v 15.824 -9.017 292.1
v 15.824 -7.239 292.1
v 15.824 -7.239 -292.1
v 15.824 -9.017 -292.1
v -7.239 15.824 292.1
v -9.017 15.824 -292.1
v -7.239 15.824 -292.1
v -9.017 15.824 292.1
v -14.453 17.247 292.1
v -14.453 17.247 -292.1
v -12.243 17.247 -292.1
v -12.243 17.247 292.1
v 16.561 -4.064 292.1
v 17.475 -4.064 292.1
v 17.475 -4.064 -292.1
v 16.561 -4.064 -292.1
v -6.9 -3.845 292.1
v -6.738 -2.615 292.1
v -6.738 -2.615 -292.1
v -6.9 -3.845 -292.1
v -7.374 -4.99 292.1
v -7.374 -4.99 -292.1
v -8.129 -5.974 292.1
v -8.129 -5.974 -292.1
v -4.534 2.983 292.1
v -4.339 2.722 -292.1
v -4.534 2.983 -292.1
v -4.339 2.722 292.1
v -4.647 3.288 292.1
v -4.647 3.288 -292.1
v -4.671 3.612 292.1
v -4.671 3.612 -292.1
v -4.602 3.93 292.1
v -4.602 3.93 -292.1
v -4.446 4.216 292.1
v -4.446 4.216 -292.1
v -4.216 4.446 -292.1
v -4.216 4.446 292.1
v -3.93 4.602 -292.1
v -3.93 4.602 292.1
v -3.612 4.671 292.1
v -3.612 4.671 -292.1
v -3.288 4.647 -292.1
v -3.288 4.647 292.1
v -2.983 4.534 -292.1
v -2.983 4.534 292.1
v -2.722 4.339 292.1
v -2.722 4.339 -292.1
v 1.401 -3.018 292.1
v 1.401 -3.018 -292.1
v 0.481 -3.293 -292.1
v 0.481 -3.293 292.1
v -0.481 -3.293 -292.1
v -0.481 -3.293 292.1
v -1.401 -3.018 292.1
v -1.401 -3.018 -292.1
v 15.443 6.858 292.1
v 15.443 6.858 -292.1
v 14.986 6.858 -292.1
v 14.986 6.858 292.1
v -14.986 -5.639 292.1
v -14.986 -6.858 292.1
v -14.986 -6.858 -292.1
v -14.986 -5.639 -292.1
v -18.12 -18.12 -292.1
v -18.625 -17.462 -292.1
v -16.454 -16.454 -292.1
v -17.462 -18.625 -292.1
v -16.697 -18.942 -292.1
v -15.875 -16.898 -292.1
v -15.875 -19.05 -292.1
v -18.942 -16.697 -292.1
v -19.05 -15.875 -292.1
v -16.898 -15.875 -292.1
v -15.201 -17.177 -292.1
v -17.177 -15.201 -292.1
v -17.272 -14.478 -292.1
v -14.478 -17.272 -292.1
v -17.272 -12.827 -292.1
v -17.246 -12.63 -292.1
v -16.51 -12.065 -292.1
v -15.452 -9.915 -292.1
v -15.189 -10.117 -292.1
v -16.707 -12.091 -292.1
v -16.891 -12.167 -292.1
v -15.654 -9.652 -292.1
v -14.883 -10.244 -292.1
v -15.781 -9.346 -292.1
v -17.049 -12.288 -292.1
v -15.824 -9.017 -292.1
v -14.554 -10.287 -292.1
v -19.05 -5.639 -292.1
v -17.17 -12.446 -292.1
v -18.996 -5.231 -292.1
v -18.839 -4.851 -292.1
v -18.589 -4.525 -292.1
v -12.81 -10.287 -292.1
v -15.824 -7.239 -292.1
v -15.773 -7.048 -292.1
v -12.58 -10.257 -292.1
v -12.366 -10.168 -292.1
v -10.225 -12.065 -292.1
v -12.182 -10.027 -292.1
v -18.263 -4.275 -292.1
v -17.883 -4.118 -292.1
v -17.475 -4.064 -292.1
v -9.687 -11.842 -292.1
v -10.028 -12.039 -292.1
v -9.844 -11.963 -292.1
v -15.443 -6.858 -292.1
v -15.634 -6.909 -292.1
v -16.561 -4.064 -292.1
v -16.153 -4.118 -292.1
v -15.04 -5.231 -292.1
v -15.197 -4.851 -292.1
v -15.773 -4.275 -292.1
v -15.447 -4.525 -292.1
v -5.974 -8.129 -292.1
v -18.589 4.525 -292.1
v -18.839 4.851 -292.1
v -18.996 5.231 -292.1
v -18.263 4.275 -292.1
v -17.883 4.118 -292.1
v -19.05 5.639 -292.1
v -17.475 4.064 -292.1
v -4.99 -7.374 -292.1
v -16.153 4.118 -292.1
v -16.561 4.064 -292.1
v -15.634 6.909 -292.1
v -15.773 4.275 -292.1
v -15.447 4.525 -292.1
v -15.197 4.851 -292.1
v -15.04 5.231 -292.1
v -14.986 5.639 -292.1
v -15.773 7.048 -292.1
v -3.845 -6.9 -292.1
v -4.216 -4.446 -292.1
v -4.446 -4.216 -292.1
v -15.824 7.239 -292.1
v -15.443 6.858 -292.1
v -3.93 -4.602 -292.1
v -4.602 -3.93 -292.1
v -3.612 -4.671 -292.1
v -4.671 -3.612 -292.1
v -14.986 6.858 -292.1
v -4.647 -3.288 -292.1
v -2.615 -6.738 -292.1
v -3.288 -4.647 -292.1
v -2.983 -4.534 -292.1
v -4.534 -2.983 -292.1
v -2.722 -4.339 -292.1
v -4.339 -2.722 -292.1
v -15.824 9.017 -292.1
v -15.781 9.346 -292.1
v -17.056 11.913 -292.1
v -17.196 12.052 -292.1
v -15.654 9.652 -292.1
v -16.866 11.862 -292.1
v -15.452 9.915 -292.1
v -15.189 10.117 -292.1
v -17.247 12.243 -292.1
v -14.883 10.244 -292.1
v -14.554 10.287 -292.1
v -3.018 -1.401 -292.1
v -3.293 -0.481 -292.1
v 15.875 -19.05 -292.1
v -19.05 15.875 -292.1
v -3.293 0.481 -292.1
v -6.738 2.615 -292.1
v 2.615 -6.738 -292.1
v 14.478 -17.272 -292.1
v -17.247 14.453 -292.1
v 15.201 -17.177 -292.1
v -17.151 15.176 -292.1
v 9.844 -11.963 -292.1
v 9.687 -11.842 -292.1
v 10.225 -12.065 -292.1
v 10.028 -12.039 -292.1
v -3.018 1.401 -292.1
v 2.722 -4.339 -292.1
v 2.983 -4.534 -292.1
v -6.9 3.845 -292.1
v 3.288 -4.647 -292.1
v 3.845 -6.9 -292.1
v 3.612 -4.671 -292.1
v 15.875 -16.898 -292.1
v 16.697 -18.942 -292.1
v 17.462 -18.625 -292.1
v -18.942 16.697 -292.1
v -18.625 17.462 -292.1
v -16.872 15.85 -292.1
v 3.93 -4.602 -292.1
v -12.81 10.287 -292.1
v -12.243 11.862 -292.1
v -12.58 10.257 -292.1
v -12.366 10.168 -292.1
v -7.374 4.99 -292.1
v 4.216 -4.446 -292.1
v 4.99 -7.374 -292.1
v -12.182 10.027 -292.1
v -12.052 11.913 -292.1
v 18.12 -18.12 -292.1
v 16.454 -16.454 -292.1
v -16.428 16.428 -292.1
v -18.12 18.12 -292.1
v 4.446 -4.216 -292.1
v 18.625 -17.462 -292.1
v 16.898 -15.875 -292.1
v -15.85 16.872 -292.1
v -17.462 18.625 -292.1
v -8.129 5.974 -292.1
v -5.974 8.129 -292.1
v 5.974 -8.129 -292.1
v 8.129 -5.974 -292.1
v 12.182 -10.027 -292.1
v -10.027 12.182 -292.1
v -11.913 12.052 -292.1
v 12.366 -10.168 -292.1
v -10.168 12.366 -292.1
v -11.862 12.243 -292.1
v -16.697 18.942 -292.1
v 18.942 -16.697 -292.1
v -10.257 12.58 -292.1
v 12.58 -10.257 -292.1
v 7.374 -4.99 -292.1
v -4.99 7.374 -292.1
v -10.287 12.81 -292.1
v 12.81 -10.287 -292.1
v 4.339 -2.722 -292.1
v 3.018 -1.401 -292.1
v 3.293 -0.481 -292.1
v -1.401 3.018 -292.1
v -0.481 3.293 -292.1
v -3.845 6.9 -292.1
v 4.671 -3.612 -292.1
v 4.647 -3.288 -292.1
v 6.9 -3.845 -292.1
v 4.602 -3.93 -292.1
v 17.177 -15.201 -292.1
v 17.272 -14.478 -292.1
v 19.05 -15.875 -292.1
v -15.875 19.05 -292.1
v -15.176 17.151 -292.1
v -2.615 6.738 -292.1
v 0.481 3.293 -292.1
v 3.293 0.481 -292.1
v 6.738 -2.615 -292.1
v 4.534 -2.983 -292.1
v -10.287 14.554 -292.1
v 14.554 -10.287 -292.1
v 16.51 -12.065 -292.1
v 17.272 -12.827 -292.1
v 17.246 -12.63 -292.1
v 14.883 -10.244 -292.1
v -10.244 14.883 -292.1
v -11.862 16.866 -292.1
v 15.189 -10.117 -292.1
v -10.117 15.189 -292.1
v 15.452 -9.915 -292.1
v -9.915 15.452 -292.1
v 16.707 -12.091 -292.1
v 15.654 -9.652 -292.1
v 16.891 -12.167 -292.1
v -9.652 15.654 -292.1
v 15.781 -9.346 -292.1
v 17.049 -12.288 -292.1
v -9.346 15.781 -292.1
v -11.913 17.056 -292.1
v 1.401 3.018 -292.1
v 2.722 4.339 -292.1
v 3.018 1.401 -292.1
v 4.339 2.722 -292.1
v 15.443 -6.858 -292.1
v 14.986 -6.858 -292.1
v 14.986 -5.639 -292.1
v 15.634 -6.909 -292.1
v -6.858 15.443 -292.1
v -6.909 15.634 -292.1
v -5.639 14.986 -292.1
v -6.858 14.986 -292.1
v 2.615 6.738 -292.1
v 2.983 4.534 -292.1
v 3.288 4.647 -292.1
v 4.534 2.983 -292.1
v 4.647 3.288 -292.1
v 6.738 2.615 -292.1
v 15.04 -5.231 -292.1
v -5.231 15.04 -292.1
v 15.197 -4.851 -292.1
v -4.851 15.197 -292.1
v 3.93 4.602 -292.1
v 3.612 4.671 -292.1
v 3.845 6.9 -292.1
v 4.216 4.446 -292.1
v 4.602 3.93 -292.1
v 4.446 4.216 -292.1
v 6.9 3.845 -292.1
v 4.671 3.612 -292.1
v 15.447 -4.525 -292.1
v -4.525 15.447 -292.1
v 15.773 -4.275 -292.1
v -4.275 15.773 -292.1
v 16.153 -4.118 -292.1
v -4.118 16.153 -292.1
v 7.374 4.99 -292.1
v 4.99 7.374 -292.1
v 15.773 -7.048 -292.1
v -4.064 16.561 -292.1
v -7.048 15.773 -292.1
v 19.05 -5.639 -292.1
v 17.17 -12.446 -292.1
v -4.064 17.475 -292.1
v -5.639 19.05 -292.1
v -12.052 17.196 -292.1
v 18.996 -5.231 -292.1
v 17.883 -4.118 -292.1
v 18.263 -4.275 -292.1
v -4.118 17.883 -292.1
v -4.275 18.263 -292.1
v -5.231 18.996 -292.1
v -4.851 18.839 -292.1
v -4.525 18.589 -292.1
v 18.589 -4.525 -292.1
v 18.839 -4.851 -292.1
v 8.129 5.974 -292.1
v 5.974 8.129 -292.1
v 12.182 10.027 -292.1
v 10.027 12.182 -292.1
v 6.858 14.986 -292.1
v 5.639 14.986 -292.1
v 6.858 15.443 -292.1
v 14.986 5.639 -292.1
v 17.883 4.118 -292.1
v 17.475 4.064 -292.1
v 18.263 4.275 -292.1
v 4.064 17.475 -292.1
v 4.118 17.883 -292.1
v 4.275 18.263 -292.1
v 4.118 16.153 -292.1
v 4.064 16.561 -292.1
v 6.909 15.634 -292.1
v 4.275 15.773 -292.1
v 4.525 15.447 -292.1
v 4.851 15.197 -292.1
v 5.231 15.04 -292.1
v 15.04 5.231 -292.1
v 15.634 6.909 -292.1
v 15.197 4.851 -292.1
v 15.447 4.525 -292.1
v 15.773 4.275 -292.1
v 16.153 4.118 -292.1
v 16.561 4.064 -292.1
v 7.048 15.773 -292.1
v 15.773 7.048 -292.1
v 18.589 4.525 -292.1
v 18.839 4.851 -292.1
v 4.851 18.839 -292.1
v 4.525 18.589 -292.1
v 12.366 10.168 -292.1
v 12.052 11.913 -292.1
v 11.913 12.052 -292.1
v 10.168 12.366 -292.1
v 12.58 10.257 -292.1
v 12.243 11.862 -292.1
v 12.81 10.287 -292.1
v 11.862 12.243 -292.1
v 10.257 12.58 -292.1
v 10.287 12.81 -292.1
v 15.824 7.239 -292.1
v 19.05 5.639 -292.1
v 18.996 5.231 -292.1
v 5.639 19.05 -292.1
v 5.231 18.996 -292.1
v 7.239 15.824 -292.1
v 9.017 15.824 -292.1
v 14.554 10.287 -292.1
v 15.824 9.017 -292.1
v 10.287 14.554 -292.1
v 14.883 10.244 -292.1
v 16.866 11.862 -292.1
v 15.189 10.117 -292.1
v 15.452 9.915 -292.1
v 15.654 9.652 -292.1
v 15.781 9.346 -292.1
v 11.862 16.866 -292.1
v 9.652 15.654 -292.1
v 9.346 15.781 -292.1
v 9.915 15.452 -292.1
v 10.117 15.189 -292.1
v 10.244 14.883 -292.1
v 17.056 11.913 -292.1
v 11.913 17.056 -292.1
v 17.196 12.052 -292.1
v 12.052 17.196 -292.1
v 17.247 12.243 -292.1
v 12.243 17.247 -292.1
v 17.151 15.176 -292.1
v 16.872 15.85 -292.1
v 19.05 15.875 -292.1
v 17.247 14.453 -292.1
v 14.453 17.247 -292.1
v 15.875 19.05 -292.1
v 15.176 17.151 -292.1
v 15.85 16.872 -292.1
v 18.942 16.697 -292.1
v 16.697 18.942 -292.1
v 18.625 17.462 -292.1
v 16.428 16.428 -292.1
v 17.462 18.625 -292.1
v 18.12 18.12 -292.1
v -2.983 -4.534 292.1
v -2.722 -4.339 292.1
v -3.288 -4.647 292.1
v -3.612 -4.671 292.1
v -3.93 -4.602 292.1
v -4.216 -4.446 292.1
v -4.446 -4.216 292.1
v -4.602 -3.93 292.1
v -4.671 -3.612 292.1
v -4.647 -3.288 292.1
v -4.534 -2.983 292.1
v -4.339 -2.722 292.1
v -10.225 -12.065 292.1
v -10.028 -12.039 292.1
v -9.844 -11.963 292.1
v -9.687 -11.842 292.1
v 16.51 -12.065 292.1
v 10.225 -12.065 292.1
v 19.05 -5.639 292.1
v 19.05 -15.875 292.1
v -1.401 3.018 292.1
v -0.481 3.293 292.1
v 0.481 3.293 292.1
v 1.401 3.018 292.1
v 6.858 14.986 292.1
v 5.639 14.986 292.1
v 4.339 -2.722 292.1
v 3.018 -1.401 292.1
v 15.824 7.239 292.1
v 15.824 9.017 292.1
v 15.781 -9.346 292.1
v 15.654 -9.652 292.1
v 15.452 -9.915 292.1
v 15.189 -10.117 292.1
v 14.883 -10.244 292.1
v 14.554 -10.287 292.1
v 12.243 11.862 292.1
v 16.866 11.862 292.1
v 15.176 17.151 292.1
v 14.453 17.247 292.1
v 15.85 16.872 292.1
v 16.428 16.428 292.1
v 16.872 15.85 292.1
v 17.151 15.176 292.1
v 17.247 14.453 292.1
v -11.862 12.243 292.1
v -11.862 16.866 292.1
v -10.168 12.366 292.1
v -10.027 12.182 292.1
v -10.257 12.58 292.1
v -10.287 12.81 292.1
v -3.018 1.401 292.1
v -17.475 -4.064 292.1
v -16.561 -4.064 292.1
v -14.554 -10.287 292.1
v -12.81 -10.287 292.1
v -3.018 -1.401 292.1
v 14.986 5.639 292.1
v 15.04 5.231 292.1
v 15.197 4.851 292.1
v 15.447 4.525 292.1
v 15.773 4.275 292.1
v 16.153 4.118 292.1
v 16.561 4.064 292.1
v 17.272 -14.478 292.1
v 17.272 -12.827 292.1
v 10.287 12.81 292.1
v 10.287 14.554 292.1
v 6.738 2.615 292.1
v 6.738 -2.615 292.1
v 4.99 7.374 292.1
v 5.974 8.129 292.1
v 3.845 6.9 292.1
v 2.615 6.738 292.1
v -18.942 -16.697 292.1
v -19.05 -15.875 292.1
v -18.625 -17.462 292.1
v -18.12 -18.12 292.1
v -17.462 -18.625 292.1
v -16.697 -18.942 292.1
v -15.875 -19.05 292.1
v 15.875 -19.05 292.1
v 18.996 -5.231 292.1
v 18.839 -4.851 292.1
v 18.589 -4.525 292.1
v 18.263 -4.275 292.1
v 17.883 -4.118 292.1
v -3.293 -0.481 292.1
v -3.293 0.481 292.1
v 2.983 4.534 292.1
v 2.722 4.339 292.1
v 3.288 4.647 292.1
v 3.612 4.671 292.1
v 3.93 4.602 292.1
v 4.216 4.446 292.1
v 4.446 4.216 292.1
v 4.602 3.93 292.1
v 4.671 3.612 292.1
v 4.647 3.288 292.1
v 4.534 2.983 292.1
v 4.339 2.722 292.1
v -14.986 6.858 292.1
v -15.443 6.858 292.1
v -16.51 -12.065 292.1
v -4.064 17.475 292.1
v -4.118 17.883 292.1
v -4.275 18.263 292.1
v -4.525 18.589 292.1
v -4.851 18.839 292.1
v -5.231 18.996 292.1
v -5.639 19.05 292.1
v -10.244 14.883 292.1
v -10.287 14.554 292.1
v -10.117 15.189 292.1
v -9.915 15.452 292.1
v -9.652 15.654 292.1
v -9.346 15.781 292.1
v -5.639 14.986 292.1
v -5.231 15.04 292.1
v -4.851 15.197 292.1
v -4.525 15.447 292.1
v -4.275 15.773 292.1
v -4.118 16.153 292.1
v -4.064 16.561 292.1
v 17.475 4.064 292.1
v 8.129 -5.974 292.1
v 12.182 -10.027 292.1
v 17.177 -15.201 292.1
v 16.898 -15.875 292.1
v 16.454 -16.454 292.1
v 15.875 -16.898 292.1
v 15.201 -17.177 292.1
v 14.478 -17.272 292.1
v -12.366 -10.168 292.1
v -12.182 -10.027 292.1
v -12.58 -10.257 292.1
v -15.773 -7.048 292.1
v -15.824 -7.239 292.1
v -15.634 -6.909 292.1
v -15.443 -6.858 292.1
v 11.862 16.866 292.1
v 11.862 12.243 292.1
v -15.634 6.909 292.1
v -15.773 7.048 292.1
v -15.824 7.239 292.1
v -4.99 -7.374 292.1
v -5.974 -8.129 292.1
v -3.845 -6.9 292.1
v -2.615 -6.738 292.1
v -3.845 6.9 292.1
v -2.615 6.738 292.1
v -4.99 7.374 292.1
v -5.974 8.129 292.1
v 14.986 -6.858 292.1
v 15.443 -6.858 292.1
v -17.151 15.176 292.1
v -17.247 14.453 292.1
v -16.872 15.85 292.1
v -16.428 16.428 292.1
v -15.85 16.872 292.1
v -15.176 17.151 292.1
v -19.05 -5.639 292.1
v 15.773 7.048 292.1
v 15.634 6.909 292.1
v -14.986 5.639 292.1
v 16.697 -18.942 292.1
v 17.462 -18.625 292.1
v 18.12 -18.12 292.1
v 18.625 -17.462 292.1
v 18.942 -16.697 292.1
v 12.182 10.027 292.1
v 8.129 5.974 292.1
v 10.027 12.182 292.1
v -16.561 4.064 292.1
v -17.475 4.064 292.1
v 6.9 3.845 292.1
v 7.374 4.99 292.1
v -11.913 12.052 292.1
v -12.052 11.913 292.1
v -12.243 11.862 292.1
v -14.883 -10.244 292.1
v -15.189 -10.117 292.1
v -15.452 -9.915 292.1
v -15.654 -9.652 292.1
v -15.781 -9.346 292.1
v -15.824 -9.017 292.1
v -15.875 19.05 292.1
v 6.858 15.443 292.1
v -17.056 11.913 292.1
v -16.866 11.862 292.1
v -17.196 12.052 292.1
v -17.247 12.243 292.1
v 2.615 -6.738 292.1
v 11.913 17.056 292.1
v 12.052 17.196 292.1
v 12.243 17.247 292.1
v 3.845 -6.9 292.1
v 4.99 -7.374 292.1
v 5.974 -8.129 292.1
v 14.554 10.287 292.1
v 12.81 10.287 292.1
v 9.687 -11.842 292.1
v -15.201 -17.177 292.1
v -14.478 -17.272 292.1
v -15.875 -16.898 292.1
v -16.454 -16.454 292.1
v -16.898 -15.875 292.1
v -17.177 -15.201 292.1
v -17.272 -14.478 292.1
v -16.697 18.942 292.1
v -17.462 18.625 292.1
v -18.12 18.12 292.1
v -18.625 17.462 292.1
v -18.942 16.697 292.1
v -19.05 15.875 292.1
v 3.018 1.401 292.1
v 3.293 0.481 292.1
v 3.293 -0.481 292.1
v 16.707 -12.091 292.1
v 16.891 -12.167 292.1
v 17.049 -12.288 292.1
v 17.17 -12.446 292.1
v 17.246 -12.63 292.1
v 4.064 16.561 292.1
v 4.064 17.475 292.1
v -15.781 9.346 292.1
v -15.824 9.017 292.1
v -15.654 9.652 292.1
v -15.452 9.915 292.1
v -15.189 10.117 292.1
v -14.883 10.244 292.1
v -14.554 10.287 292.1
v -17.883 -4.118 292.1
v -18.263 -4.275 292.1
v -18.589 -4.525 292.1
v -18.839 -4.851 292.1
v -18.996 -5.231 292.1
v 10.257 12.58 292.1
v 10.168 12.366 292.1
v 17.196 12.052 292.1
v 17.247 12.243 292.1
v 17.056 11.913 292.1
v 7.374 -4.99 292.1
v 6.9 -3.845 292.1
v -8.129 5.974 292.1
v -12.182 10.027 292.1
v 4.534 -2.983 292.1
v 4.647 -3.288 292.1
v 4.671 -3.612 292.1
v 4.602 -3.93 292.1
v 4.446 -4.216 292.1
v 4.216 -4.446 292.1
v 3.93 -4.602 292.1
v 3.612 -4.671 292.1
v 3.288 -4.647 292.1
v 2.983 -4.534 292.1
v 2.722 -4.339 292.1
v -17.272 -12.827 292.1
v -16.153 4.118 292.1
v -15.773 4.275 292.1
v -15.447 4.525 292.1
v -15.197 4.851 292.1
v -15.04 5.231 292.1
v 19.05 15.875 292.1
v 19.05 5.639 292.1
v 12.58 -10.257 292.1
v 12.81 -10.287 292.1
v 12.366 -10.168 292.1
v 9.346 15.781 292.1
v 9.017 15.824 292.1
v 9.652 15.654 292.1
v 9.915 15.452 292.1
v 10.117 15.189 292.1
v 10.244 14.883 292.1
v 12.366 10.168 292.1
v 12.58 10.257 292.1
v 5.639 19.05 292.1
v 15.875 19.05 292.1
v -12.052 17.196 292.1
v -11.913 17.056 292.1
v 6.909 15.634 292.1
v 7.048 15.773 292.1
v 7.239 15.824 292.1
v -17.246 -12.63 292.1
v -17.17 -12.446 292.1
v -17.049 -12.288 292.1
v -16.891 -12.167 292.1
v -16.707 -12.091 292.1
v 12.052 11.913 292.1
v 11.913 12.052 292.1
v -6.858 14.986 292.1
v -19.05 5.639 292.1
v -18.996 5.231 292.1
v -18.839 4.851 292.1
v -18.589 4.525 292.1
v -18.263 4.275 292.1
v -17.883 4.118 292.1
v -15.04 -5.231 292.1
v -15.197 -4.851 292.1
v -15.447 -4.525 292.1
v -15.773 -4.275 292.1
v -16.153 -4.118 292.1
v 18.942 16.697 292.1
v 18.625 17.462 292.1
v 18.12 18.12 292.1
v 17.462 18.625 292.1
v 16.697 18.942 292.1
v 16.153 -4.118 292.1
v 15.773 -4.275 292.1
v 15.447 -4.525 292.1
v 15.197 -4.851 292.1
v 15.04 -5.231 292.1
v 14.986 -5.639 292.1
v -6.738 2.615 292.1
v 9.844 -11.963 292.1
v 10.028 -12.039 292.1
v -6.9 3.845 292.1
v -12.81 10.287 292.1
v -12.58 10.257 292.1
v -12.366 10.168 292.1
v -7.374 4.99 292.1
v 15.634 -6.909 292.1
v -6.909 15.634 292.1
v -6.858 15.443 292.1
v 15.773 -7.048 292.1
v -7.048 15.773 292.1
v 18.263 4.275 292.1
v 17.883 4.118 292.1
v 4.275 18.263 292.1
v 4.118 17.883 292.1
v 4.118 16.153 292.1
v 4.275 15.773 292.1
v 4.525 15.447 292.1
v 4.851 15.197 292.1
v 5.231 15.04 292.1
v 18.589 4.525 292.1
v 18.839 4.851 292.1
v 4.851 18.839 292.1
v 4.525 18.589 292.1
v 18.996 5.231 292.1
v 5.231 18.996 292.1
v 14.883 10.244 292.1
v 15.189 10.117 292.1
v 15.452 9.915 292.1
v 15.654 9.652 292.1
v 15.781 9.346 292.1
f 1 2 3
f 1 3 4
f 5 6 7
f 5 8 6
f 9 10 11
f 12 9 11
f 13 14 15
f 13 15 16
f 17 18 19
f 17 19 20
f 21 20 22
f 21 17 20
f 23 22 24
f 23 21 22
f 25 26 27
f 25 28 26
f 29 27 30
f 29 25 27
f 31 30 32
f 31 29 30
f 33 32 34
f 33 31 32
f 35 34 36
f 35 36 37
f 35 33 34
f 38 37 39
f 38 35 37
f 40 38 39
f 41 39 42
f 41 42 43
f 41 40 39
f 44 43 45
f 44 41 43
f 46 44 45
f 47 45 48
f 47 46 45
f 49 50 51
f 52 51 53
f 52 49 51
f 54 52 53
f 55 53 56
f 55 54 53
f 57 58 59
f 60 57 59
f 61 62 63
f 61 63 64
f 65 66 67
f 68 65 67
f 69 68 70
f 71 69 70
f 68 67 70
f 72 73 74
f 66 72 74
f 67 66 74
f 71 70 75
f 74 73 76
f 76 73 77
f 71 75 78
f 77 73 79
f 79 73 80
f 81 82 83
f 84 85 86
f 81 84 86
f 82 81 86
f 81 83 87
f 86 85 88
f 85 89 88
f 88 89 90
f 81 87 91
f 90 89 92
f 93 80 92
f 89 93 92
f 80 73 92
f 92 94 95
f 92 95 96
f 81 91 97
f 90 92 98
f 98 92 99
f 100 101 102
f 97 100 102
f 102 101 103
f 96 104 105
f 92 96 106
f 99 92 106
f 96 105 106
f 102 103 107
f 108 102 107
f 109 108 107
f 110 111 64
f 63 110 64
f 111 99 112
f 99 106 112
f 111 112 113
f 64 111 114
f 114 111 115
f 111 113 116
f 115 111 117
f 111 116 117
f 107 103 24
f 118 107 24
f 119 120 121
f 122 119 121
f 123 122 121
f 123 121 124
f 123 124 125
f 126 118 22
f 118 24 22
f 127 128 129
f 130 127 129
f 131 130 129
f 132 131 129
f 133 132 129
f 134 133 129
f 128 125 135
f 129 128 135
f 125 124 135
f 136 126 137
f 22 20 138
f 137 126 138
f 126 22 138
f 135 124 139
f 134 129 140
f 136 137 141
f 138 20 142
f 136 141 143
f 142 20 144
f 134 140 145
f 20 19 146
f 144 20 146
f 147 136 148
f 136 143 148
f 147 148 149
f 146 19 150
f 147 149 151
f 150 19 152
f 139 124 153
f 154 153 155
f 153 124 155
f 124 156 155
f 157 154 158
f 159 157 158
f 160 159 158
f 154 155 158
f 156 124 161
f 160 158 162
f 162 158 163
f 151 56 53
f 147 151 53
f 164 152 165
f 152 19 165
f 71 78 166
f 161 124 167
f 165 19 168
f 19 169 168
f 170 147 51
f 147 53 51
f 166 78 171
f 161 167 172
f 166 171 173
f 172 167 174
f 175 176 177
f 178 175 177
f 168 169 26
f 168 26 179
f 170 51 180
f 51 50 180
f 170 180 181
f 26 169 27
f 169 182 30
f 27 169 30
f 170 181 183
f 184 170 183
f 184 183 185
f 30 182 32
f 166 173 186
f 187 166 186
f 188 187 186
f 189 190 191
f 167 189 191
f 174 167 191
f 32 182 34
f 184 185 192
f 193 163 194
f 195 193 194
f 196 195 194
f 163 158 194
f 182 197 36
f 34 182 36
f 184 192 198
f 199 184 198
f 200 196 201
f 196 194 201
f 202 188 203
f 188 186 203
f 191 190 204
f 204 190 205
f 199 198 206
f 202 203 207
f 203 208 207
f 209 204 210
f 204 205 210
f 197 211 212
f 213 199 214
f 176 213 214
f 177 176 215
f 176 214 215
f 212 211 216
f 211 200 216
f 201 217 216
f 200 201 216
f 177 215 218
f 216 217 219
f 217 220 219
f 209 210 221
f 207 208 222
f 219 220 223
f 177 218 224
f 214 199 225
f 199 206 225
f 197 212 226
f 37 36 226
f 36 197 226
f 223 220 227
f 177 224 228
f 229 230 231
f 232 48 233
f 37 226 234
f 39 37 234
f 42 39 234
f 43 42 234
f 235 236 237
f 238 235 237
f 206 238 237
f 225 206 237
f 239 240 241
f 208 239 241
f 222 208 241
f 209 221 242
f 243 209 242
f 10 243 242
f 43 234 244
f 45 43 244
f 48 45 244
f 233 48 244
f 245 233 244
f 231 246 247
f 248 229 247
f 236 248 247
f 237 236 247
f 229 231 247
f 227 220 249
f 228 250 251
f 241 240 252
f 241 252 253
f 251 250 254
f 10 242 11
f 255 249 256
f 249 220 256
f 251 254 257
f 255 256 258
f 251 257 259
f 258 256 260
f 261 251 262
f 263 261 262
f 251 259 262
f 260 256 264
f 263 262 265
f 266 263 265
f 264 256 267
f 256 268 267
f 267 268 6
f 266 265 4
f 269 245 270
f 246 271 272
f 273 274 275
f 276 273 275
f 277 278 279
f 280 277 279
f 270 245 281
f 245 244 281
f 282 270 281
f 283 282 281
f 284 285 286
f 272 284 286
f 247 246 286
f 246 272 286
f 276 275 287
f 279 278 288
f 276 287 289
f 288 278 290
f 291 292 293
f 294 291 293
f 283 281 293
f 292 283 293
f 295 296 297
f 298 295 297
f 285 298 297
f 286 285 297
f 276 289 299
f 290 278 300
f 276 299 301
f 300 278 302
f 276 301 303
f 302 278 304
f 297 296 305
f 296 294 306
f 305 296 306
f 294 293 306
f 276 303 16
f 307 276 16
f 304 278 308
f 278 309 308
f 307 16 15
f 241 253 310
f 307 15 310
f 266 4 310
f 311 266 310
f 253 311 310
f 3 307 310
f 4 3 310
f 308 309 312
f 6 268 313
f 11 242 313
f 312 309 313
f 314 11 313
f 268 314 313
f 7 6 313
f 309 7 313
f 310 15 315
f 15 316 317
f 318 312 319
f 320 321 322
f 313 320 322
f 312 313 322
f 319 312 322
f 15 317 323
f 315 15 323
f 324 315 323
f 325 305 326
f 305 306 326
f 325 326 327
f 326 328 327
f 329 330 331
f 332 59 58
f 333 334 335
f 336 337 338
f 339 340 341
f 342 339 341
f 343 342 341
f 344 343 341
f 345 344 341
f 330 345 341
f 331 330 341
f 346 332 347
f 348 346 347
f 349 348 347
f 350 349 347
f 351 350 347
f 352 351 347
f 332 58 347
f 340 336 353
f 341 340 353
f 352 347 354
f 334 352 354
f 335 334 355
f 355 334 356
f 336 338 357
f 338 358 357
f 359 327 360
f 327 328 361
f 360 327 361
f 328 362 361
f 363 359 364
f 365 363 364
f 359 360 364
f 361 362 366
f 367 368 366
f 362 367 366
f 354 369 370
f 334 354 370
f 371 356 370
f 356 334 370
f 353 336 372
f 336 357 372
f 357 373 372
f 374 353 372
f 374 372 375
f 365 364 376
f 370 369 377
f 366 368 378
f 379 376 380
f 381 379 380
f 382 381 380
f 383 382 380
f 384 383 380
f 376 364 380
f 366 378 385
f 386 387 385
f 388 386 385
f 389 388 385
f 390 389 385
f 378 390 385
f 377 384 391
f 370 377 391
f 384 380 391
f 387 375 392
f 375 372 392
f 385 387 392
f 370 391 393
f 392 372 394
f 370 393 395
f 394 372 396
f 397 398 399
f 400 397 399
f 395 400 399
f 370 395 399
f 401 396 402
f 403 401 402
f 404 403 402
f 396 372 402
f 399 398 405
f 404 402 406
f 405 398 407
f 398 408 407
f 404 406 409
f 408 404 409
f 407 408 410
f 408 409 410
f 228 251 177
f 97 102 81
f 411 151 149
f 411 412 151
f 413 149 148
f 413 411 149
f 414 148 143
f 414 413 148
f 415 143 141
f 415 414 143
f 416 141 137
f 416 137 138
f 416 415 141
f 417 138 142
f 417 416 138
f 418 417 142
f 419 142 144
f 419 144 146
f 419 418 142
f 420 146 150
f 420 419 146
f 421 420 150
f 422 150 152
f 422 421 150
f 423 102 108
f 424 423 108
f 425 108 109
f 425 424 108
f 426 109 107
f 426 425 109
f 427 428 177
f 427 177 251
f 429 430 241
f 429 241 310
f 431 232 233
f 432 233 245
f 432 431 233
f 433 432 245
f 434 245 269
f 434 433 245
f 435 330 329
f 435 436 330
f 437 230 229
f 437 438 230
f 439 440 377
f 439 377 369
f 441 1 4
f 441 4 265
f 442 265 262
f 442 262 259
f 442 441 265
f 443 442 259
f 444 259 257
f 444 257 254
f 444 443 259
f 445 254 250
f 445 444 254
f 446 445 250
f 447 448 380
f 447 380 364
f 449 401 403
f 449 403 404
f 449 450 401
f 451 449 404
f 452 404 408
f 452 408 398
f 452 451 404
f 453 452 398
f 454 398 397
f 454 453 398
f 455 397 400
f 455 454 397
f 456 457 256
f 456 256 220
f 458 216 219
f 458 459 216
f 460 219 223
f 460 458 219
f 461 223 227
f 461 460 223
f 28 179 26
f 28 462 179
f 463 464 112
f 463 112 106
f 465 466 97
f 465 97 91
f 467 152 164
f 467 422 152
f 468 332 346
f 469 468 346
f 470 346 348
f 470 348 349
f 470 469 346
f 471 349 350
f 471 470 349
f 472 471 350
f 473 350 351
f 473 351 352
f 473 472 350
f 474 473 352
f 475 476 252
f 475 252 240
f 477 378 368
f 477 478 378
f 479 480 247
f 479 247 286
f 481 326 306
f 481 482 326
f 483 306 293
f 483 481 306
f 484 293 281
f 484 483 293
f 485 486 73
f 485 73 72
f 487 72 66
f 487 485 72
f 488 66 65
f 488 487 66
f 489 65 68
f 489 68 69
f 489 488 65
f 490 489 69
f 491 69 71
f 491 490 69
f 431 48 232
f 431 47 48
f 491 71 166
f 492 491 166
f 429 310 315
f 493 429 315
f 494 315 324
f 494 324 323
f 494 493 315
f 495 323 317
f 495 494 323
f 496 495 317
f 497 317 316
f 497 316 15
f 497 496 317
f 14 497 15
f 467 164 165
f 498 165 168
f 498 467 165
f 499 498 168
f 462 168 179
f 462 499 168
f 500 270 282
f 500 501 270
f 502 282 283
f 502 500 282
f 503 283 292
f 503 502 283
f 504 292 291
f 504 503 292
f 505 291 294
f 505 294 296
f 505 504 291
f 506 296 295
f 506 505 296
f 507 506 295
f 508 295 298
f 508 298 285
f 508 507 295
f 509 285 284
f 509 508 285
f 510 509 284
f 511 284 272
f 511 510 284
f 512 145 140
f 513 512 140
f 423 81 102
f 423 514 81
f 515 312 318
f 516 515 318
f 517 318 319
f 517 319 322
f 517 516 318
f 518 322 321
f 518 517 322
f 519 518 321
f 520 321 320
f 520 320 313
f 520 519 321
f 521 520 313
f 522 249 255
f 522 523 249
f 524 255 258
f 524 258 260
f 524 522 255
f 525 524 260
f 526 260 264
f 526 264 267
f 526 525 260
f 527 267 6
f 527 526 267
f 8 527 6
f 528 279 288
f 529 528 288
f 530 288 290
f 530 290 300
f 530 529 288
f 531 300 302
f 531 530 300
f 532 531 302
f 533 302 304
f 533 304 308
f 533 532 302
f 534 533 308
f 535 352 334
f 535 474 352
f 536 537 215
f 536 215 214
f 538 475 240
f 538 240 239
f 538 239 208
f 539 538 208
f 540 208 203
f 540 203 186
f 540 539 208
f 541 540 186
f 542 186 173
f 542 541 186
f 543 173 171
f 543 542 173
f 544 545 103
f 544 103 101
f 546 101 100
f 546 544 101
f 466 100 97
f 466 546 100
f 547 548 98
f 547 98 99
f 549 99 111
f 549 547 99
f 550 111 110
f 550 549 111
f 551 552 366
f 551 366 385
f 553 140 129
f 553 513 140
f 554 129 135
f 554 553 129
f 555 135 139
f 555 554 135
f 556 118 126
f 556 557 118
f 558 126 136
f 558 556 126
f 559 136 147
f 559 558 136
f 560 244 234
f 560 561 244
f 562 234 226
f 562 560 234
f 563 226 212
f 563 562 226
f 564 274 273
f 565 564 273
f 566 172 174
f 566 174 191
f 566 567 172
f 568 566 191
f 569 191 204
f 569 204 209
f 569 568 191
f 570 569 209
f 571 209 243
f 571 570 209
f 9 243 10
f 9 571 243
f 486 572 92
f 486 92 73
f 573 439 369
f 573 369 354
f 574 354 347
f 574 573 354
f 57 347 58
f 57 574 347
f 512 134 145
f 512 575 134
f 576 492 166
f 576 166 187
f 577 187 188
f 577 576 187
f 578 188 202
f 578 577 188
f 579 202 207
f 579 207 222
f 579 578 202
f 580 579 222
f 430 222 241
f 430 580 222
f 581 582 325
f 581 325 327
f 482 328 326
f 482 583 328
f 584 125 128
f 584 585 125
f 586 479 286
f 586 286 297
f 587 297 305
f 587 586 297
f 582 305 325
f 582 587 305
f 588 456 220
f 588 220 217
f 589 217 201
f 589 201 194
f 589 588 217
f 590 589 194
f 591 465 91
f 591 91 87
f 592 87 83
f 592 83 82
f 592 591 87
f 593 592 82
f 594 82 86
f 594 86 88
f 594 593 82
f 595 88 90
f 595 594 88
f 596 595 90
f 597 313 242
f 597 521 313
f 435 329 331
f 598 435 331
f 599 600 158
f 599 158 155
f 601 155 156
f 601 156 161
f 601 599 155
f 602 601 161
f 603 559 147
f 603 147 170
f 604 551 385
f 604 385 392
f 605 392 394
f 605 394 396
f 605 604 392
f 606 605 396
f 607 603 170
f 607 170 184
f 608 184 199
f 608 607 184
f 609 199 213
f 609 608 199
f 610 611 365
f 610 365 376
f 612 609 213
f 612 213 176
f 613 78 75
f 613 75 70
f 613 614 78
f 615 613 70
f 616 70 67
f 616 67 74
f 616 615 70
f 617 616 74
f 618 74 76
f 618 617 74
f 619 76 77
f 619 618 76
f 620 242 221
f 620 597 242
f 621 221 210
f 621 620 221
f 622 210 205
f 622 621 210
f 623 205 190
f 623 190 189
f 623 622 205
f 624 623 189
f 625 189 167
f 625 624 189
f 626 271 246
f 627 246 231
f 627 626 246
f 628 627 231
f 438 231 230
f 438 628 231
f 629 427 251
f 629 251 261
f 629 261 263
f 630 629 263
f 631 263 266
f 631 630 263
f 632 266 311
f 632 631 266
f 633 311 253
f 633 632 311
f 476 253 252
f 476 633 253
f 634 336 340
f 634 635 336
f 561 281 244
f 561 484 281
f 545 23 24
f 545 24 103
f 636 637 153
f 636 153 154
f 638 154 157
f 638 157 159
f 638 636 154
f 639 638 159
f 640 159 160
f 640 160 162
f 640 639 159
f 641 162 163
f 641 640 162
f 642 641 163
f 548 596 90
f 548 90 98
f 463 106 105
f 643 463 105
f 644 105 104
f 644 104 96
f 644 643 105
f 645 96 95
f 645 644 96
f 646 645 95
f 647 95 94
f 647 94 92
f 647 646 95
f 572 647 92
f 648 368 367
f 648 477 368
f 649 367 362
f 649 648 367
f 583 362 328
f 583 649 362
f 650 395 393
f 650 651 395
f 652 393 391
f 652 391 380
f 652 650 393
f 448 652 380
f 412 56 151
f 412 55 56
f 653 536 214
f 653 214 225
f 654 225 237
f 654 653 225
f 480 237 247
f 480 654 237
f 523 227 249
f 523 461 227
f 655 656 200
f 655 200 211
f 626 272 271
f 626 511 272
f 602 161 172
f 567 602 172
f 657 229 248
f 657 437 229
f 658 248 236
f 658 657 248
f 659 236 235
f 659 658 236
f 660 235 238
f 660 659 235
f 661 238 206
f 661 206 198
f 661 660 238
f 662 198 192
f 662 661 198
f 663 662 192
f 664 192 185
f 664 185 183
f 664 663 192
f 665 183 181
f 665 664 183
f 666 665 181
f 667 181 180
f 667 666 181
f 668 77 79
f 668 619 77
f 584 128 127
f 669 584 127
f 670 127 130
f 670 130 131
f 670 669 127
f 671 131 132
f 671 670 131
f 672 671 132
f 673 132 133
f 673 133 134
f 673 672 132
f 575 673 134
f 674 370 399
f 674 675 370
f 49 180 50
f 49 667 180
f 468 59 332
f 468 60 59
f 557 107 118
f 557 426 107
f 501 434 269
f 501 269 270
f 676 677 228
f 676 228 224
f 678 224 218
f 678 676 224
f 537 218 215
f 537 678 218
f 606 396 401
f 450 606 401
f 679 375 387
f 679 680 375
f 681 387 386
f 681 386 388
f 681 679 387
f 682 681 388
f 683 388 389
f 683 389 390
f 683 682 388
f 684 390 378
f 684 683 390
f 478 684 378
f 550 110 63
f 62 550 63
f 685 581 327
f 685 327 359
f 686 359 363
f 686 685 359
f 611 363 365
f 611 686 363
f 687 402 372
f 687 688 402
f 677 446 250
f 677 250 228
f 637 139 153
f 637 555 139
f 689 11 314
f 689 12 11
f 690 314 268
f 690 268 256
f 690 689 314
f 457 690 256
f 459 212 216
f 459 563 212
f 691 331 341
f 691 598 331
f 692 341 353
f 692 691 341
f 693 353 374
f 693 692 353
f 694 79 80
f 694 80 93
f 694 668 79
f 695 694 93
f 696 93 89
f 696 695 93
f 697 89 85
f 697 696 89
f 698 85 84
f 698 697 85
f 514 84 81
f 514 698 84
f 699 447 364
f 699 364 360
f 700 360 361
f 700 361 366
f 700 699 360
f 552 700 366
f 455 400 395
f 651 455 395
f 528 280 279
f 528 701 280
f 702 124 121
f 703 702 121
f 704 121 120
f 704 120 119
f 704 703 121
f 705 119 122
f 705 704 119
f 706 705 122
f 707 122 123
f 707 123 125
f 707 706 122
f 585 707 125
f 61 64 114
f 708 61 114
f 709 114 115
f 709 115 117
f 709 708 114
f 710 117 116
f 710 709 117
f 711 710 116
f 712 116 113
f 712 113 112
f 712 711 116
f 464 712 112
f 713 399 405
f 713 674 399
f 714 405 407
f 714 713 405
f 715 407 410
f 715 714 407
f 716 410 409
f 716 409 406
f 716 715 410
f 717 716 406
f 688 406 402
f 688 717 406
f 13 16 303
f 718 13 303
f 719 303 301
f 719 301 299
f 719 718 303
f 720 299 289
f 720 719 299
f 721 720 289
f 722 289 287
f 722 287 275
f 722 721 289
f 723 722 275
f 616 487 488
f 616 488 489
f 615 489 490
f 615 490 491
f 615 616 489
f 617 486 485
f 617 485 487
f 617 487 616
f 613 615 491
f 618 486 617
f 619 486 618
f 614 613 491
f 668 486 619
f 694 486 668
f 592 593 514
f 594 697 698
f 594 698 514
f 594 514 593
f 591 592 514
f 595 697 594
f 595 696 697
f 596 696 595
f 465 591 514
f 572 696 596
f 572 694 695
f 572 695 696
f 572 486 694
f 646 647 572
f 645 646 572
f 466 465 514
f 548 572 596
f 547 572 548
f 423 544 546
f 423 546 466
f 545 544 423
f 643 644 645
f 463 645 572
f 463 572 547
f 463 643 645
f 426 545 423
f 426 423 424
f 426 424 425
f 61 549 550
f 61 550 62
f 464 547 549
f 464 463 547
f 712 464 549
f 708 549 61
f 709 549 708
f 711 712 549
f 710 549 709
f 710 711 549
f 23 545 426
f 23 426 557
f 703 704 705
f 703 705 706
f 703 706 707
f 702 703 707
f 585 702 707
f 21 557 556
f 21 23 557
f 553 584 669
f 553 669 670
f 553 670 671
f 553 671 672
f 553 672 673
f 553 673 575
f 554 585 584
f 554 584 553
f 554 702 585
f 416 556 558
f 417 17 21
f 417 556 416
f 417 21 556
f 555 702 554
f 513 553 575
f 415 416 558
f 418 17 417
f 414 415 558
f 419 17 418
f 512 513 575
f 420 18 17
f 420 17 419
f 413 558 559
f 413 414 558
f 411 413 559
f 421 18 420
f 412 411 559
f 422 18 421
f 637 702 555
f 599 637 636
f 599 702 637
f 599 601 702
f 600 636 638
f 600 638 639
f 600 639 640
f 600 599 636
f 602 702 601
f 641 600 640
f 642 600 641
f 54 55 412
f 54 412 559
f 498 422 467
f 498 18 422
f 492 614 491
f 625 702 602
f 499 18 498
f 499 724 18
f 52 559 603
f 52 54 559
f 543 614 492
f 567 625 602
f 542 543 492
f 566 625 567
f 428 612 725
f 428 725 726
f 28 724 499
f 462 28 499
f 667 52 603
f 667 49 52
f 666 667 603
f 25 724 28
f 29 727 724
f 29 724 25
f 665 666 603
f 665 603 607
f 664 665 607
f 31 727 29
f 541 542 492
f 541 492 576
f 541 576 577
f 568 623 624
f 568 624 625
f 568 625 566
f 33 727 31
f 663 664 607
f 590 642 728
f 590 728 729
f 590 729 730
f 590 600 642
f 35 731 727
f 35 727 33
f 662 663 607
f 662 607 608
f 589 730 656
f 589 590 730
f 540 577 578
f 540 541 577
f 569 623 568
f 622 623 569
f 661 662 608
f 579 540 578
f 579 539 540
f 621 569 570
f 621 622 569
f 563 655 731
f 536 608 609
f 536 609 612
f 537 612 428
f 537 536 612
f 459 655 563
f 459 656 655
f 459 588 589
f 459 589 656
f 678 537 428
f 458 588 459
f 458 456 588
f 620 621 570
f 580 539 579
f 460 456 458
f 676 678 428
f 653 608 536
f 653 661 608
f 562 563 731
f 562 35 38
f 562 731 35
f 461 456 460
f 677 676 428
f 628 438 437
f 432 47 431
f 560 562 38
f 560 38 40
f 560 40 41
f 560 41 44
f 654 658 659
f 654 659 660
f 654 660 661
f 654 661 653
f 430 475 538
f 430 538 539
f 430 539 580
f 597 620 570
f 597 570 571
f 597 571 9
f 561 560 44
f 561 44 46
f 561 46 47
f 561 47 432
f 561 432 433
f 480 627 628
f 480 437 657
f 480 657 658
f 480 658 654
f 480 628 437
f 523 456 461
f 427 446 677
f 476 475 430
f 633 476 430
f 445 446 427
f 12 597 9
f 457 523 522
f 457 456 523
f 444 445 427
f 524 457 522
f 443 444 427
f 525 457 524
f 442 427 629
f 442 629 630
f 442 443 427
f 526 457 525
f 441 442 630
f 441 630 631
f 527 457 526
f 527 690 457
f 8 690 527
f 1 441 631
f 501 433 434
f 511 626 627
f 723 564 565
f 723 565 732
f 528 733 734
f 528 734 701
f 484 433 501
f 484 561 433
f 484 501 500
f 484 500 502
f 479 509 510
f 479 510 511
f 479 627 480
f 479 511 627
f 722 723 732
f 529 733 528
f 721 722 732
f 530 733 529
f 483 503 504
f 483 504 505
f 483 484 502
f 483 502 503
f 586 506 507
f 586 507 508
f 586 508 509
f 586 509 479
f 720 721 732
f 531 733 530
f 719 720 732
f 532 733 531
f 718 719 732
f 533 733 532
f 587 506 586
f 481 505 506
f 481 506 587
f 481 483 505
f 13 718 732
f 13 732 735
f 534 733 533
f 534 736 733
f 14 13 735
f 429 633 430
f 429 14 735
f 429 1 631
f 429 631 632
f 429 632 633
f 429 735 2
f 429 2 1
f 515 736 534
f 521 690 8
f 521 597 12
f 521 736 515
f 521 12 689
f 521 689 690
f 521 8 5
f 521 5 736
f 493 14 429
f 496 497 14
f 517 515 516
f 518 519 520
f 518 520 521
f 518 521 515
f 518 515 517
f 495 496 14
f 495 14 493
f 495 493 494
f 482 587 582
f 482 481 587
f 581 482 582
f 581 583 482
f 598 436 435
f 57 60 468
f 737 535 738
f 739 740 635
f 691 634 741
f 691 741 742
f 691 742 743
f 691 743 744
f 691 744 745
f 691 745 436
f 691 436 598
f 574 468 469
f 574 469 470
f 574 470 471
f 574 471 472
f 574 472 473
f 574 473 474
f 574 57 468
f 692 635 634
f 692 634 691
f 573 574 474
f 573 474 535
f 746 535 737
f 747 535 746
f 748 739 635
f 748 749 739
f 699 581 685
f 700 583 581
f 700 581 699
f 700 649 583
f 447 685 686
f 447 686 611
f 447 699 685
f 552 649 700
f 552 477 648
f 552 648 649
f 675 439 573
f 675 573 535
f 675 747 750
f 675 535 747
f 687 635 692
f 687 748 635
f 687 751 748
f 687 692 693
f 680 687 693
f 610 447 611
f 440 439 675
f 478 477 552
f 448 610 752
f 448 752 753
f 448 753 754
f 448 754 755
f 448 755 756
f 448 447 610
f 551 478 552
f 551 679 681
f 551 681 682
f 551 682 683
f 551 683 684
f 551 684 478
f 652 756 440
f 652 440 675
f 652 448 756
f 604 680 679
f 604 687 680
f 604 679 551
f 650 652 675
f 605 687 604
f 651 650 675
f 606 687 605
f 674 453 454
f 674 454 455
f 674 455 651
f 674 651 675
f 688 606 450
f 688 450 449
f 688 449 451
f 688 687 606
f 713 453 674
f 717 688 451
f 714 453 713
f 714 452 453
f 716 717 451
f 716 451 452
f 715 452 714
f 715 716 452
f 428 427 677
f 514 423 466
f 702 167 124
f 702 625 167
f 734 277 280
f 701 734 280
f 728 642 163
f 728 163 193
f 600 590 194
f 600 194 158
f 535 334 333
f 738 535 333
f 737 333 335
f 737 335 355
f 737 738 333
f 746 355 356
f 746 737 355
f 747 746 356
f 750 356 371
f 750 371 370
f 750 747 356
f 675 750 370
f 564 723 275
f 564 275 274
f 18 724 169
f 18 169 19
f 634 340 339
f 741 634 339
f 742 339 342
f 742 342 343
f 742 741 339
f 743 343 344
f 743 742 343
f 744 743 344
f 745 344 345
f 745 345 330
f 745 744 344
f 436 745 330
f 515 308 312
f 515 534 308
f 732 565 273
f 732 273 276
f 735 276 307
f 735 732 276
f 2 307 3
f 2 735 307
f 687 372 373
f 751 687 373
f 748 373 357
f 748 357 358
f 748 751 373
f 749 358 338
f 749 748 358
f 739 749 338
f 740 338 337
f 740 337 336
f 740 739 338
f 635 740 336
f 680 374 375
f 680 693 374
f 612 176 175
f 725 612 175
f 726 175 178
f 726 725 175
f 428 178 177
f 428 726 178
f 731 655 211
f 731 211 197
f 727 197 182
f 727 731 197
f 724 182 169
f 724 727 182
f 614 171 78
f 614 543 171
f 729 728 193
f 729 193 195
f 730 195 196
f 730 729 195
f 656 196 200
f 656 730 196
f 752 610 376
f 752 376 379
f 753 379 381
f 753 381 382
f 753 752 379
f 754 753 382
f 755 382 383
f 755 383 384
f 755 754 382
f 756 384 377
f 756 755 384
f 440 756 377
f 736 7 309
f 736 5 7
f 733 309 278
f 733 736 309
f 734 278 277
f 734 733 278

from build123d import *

# Parameters (mm, degrees)
EXTRUDE1_DEPTH     = 292.1
F_7060_LEFT_D      = 6.6548
F_7060_LEFT_DEPTH  = 20.1168
F_7060_LEFT_TIP    = 1.999303624
F_7060_RIGHT_D     = 6.6548
F_7060_RIGHT_DEPTH = 20.1168
F_7060_RIGHT_TIP   = 1.999303624


with BuildPart() as part:
    # Sketch1 → Extrude1 (new, symmetric)
    with BuildSketch(Plane.XY):
        with BuildLine():
            Line((-15.8242, 7.239), (-15.8242, 9.017))
            ThreePointArc((-15.8242, 9.017), (-15.452225612, 9.915025612), (-14.5542, 10.287))
            Line((-14.5542, 10.287), (-12.810497326, 10.287))
            ThreePointArc((-12.810497326, 10.287), (-12.470291755, 10.219328904), (-12.181879398, 10.026617928))
            Line((-12.181879398, 10.026617928), (-8.129198975, 5.973937506))
            ThreePointArc((-8.129198975, 5.973937506), (-7.09957176, 4.432991483), (-6.738014764, 2.615321716))
            Line((-6.738014764, 2.615321716), (-6.738014764, -2.615321716))
            ThreePointArc((-6.738014764, -2.615321716), (-7.09957176, -4.432991483), (-8.129198975, -5.973937506))
            Line((-8.129198975, -5.973937506), (-12.181879398, -10.026617928))
            ThreePointArc((-12.181879398, -10.026617928), (-12.470291755, -10.219328904), (-12.810497326, -10.287))
            Line((-12.810497326, -10.287), (-14.5542, -10.287))
            ThreePointArc((-14.5542, -10.287), (-15.452225612, -9.915025612), (-15.8242, -9.017))
            Line((-15.8242, -9.017), (-15.8242, -7.239))
            ThreePointArc((-15.8242, -7.239), (-15.712607684, -6.969592316), (-15.4432, -6.858))
            Line((-15.4432, -6.858), (-14.986, -6.858))
            Line((-14.986, -6.858), (-14.986, -5.6388))
            ThreePointArc((-14.986, -5.6388), (-15.447248241, -4.525248241), (-16.5608, -4.064))
            Line((-16.5608, -4.064), (-17.4752, -4.064))
            ThreePointArc((-17.4752, -4.064), (-18.588751759, -4.525248241), (-19.05, -5.6388))
            Line((-19.05, -5.6388), (-19.05, -15.875))
            ThreePointArc((-19.05, -15.875), (-18.12006403, -18.12006403), (-15.875, -19.05))
            Line((-15.875, -19.05), (15.875, -19.05))
            ThreePointArc((15.875, -19.05), (18.12006403, -18.12006403), (19.05, -15.875))
            Line((19.05, -15.875), (19.05, -5.6388))
            ThreePointArc((19.05, -5.6388), (18.588751759, -4.525248241), (17.4752, -4.064))
            Line((17.4752, -4.064), (16.5608, -4.064))
            ThreePointArc((16.5608, -4.064), (15.447248241, -4.525248241), (14.986, -5.6388))
            Line((14.986, -5.6388), (14.986, -6.858))
            Line((14.986, -6.858), (15.4432, -6.858))
            ThreePointArc((15.4432, -6.858), (15.712607684, -6.969592316), (15.8242, -7.239))
            Line((15.8242, -7.239), (15.8242, -9.017))
            ThreePointArc((15.8242, -9.017), (15.452225612, -9.915025612), (14.5542, -10.287))
            Line((14.5542, -10.287), (12.810497326, -10.287))
            ThreePointArc((12.810497326, -10.287), (12.470291755, -10.219328904), (12.181879398, -10.026617928))
            Line((12.181879398, -10.026617928), (8.129198975, -5.973937506))
            ThreePointArc((8.129198975, -5.973937506), (7.09957176, -4.432991483), (6.738014764, -2.615321716))
            Line((6.738014764, -2.615321716), (6.738014764, 2.615321716))
            ThreePointArc((6.738014764, 2.615321716), (7.09957176, 4.432991483), (8.129198975, 5.973937506))
            Line((8.129198975, 5.973937506), (12.181879398, 10.026617928))
            ThreePointArc((12.181879398, 10.026617928), (12.470291755, 10.219328904), (12.810497326, 10.287))
            Line((12.810497326, 10.287), (14.5542, 10.287))
            ThreePointArc((14.5542, 10.287), (15.452225612, 9.915025612), (15.8242, 9.017))
            Line((15.8242, 9.017), (15.8242, 7.239))
            ThreePointArc((15.8242, 7.239), (15.712607684, 6.969592316), (15.4432, 6.858))
            Line((15.4432, 6.858), (14.986, 6.858))
            Line((14.986, 6.858), (14.986, 5.6388))
            ThreePointArc((14.986, 5.6388), (15.447248241, 4.525248241), (16.5608, 4.064))
            Line((16.5608, 4.064), (17.4752, 4.064))
            ThreePointArc((17.4752, 4.064), (18.588751759, 4.525248241), (19.05, 5.6388))
            Line((19.05, 5.6388), (19.05, 15.875))
            ThreePointArc((19.05, 15.875), (18.12006403, 18.12006403), (15.875, 19.05))
            Line((15.875, 19.05), (5.6388, 19.05))
            ThreePointArc((5.6388, 19.05), (4.525248241, 18.588751759), (4.064, 17.4752))
            Line((4.064, 17.4752), (4.064, 16.5608))
            ThreePointArc((4.064, 16.5608), (4.525248241, 15.447248241), (5.6388, 14.986))
            Line((5.6388, 14.986), (6.858, 14.986))
            Line((6.858, 14.986), (6.858, 15.4432))
            ThreePointArc((6.858, 15.4432), (6.969592316, 15.712607684), (7.239, 15.8242))
            Line((7.239, 15.8242), (9.017, 15.8242))
            ThreePointArc((9.017, 15.8242), (9.915025612, 15.452225612), (10.287, 14.5542))
            Line((10.287, 14.5542), (10.287, 12.810497326))
            ThreePointArc((10.287, 12.810497326), (10.219328904, 12.470291755), (10.026617928, 12.181879398))
            Line((10.026617928, 12.181879398), (5.973937506, 8.129198975))
            ThreePointArc((5.973937506, 8.129198975), (4.432991483, 7.09957176), (2.615321716, 6.738014764))
            Line((2.615321716, 6.738014764), (-2.615321716, 6.738014764))
            ThreePointArc((-2.615321716, 6.738014764), (-4.432991483, 7.09957176), (-5.973937506, 8.129198975))
            Line((-5.973937506, 8.129198975), (-10.026617928, 12.181879398))
            ThreePointArc((-10.026617928, 12.181879398), (-10.219328904, 12.470291755), (-10.287, 12.810497326))
            Line((-10.287, 12.810497326), (-10.287, 14.5542))
            ThreePointArc((-10.287, 14.5542), (-9.915025612, 15.452225612), (-9.017, 15.8242))
            Line((-9.017, 15.8242), (-7.239, 15.8242))
            ThreePointArc((-7.239, 15.8242), (-6.969592316, 15.712607684), (-6.858, 15.4432))
            Line((-6.858, 15.4432), (-6.858, 14.986))
            Line((-6.858, 14.986), (-5.6388, 14.986))
            ThreePointArc((-5.6388, 14.986), (-4.525248241, 15.447248241), (-4.064, 16.5608))
            Line((-4.064, 16.5608), (-4.064, 17.4752))
            ThreePointArc((-4.064, 17.4752), (-4.525248241, 18.588751759), (-5.6388, 19.05))
            Line((-5.6388, 19.05), (-15.875, 19.05))
            ThreePointArc((-15.875, 19.05), (-18.12006403, 18.12006403), (-19.05, 15.875))
            Line((-19.05, 15.875), (-19.05, 5.6388))
            ThreePointArc((-19.05, 5.6388), (-18.588751759, 4.525248241), (-17.4752, 4.064))
            Line((-17.4752, 4.064), (-16.5608, 4.064))
            ThreePointArc((-16.5608, 4.064), (-15.447248241, 4.525248241), (-14.986, 5.6388))
            Line((-14.986, 5.6388), (-14.986, 6.858))
            Line((-14.986, 6.858), (-15.4432, 6.858))
            ThreePointArc((-15.4432, 6.858), (-15.712607684, 6.969592316), (-15.8242, 7.239))
        make_face()
        with BuildLine():
            Line((-2.615321716, -6.738014764), (2.615321716, -6.738014764))
            ThreePointArc((2.615321716, -6.738014764), (4.432991483, -7.09957176), (5.973937506, -8.129198975))
            Line((5.973937506, -8.129198975), (9.686553898, -11.841815367))
            ThreePointArc((9.686553898, -11.841815367), (9.93376449, -12.006996204), (10.225369265, -12.065))
            Line((10.225369265, -12.065), (16.51, -12.065))
            ThreePointArc((16.51, -12.065), (17.048815367, -12.288184633), (17.272, -12.827))
            Line((17.272, -12.827), (17.272, -14.478))
            ThreePointArc((17.272, -14.478), (16.453656347, -16.453656347), (14.478, -17.272))
            Line((14.478, -17.272), (-14.478, -17.272))
            ThreePointArc((-14.478, -17.272), (-16.453656347, -16.453656347), (-17.272, -14.478))
            Line((-17.272, -14.478), (-17.272, -12.827))
            ThreePointArc((-17.272, -12.827), (-17.048815367, -12.288184633), (-16.51, -12.065))
            Line((-16.51, -12.065), (-10.225369265, -12.065))
            ThreePointArc((-10.225369265, -12.065), (-9.93376449, -12.006996204), (-9.686553898, -11.841815367))
            Line((-9.686553898, -11.841815367), (-5.973937506, -8.129198975))
            ThreePointArc((-5.973937506, -8.129198975), (-4.432991483, -7.09957176), (-2.615321716, -6.738014764))
        make_face(mode=Mode.SUBTRACT)
        with BuildLine():
            Line((16.8656, 11.8618), (12.2428, 11.8618))
            ThreePointArc((12.2428, 11.8618), (11.973392316, 11.973392316), (11.8618, 12.2428))
            Line((11.8618, 12.2428), (11.8618, 16.8656))
            ThreePointArc((11.8618, 16.8656), (11.973392316, 17.135007684), (12.2428, 17.2466))
            Line((12.2428, 17.2466), (14.4526, 17.2466))
            ThreePointArc((14.4526, 17.2466), (16.428256347, 16.428256347), (17.2466, 14.4526))
            Line((17.2466, 14.4526), (17.2466, 12.2428))
            ThreePointArc((17.2466, 12.2428), (17.135007684, 11.973392316), (16.8656, 11.8618))
        make_face(mode=Mode.SUBTRACT)
        with BuildLine():
            Line((-11.8618, 16.8656), (-11.8618, 12.2428))
            ThreePointArc((-11.8618, 12.2428), (-11.973392316, 11.973392316), (-12.2428, 11.8618))
            Line((-12.2428, 11.8618), (-16.8656, 11.8618))
            ThreePointArc((-16.8656, 11.8618), (-17.135007684, 11.973392316), (-17.2466, 12.2428))
            Line((-17.2466, 12.2428), (-17.2466, 14.4526))
            ThreePointArc((-17.2466, 14.4526), (-16.428256347, 16.428256347), (-14.4526, 17.2466))
            Line((-14.4526, 17.2466), (-12.2428, 17.2466))
            ThreePointArc((-12.2428, 17.2466), (-11.973392316, 17.135007684), (-11.8618, 16.8656))
        make_face(mode=Mode.SUBTRACT)
        with BuildLine():
            Line((1.401430967, 3.017877069), (2.722376949, 4.338823051))
            ThreePointArc((2.722376949, 4.338823051), (4.338823051, 4.338823051), (4.338823051, 2.722376949))
            Line((4.338823051, 2.722376949), (3.017877069, 1.401430967))
            ThreePointArc((3.017877069, 1.401430967), (3.3274, 0), (3.017877069, -1.401430967))
            Line((3.017877069, -1.401430967), (4.338823051, -2.722376949))
            ThreePointArc((4.338823051, -2.722376949), (4.338823051, -4.338823051), (2.722376949, -4.338823051))
            Line((2.722376949, -4.338823051), (1.401430967, -3.017877069))
            ThreePointArc((1.401430967, -3.017877069), (0, -3.3274), (-1.401430967, -3.017877069))
            Line((-1.401430967, -3.017877069), (-2.722376949, -4.338823051))
            ThreePointArc((-2.722376949, -4.338823051), (-4.338823051, -4.338823051), (-4.338823051, -2.722376949))
            Line((-4.338823051, -2.722376949), (-3.017877069, -1.401430967))
            ThreePointArc((-3.017877069, -1.401430967), (-3.3274, 0), (-3.017877069, 1.401430967))
            Line((-3.017877069, 1.401430967), (-4.338823051, 2.722376949))
            ThreePointArc((-4.338823051, 2.722376949), (-4.338823051, 4.338823051), (-2.722376949, 4.338823051))
            Line((-2.722376949, 4.338823051), (-1.401430967, 3.017877069))
            ThreePointArc((-1.401430967, 3.017877069), (0, 3.3274), (1.401430967, 3.017877069))
        make_face(mode=Mode.SUBTRACT)
    extrude(amount=EXTRUDE1_DEPTH, both=True)

    # 7060-LEFT
    with Locations(Plane.XY.offset(292.1)):
        with Locations((0, 0)):
            Hole(F_7060_LEFT_D / 2, depth=F_7060_LEFT_DEPTH)
            with Locations((0, 0, -(F_7060_LEFT_DEPTH + F_7060_LEFT_TIP / 2))):  # 118° drill point
                Cone(0, F_7060_LEFT_D / 2, F_7060_LEFT_TIP, mode=Mode.SUBTRACT)

    # 7060-RIGHT
    with Locations(Plane(origin=(0, 0, -292.1), x_dir=(-1, 0, 0), z_dir=(0, 0, -1))):
        with Locations((0, 0)):
            Hole(F_7060_RIGHT_D / 2, depth=F_7060_RIGHT_DEPTH)
            with Locations((0, 0, -(F_7060_RIGHT_DEPTH + F_7060_RIGHT_TIP / 2))):  # 118° drill point
                Cone(0, F_7060_RIGHT_D / 2, F_7060_RIGHT_TIP, mode=Mode.SUBTRACT)


solid = part.part
